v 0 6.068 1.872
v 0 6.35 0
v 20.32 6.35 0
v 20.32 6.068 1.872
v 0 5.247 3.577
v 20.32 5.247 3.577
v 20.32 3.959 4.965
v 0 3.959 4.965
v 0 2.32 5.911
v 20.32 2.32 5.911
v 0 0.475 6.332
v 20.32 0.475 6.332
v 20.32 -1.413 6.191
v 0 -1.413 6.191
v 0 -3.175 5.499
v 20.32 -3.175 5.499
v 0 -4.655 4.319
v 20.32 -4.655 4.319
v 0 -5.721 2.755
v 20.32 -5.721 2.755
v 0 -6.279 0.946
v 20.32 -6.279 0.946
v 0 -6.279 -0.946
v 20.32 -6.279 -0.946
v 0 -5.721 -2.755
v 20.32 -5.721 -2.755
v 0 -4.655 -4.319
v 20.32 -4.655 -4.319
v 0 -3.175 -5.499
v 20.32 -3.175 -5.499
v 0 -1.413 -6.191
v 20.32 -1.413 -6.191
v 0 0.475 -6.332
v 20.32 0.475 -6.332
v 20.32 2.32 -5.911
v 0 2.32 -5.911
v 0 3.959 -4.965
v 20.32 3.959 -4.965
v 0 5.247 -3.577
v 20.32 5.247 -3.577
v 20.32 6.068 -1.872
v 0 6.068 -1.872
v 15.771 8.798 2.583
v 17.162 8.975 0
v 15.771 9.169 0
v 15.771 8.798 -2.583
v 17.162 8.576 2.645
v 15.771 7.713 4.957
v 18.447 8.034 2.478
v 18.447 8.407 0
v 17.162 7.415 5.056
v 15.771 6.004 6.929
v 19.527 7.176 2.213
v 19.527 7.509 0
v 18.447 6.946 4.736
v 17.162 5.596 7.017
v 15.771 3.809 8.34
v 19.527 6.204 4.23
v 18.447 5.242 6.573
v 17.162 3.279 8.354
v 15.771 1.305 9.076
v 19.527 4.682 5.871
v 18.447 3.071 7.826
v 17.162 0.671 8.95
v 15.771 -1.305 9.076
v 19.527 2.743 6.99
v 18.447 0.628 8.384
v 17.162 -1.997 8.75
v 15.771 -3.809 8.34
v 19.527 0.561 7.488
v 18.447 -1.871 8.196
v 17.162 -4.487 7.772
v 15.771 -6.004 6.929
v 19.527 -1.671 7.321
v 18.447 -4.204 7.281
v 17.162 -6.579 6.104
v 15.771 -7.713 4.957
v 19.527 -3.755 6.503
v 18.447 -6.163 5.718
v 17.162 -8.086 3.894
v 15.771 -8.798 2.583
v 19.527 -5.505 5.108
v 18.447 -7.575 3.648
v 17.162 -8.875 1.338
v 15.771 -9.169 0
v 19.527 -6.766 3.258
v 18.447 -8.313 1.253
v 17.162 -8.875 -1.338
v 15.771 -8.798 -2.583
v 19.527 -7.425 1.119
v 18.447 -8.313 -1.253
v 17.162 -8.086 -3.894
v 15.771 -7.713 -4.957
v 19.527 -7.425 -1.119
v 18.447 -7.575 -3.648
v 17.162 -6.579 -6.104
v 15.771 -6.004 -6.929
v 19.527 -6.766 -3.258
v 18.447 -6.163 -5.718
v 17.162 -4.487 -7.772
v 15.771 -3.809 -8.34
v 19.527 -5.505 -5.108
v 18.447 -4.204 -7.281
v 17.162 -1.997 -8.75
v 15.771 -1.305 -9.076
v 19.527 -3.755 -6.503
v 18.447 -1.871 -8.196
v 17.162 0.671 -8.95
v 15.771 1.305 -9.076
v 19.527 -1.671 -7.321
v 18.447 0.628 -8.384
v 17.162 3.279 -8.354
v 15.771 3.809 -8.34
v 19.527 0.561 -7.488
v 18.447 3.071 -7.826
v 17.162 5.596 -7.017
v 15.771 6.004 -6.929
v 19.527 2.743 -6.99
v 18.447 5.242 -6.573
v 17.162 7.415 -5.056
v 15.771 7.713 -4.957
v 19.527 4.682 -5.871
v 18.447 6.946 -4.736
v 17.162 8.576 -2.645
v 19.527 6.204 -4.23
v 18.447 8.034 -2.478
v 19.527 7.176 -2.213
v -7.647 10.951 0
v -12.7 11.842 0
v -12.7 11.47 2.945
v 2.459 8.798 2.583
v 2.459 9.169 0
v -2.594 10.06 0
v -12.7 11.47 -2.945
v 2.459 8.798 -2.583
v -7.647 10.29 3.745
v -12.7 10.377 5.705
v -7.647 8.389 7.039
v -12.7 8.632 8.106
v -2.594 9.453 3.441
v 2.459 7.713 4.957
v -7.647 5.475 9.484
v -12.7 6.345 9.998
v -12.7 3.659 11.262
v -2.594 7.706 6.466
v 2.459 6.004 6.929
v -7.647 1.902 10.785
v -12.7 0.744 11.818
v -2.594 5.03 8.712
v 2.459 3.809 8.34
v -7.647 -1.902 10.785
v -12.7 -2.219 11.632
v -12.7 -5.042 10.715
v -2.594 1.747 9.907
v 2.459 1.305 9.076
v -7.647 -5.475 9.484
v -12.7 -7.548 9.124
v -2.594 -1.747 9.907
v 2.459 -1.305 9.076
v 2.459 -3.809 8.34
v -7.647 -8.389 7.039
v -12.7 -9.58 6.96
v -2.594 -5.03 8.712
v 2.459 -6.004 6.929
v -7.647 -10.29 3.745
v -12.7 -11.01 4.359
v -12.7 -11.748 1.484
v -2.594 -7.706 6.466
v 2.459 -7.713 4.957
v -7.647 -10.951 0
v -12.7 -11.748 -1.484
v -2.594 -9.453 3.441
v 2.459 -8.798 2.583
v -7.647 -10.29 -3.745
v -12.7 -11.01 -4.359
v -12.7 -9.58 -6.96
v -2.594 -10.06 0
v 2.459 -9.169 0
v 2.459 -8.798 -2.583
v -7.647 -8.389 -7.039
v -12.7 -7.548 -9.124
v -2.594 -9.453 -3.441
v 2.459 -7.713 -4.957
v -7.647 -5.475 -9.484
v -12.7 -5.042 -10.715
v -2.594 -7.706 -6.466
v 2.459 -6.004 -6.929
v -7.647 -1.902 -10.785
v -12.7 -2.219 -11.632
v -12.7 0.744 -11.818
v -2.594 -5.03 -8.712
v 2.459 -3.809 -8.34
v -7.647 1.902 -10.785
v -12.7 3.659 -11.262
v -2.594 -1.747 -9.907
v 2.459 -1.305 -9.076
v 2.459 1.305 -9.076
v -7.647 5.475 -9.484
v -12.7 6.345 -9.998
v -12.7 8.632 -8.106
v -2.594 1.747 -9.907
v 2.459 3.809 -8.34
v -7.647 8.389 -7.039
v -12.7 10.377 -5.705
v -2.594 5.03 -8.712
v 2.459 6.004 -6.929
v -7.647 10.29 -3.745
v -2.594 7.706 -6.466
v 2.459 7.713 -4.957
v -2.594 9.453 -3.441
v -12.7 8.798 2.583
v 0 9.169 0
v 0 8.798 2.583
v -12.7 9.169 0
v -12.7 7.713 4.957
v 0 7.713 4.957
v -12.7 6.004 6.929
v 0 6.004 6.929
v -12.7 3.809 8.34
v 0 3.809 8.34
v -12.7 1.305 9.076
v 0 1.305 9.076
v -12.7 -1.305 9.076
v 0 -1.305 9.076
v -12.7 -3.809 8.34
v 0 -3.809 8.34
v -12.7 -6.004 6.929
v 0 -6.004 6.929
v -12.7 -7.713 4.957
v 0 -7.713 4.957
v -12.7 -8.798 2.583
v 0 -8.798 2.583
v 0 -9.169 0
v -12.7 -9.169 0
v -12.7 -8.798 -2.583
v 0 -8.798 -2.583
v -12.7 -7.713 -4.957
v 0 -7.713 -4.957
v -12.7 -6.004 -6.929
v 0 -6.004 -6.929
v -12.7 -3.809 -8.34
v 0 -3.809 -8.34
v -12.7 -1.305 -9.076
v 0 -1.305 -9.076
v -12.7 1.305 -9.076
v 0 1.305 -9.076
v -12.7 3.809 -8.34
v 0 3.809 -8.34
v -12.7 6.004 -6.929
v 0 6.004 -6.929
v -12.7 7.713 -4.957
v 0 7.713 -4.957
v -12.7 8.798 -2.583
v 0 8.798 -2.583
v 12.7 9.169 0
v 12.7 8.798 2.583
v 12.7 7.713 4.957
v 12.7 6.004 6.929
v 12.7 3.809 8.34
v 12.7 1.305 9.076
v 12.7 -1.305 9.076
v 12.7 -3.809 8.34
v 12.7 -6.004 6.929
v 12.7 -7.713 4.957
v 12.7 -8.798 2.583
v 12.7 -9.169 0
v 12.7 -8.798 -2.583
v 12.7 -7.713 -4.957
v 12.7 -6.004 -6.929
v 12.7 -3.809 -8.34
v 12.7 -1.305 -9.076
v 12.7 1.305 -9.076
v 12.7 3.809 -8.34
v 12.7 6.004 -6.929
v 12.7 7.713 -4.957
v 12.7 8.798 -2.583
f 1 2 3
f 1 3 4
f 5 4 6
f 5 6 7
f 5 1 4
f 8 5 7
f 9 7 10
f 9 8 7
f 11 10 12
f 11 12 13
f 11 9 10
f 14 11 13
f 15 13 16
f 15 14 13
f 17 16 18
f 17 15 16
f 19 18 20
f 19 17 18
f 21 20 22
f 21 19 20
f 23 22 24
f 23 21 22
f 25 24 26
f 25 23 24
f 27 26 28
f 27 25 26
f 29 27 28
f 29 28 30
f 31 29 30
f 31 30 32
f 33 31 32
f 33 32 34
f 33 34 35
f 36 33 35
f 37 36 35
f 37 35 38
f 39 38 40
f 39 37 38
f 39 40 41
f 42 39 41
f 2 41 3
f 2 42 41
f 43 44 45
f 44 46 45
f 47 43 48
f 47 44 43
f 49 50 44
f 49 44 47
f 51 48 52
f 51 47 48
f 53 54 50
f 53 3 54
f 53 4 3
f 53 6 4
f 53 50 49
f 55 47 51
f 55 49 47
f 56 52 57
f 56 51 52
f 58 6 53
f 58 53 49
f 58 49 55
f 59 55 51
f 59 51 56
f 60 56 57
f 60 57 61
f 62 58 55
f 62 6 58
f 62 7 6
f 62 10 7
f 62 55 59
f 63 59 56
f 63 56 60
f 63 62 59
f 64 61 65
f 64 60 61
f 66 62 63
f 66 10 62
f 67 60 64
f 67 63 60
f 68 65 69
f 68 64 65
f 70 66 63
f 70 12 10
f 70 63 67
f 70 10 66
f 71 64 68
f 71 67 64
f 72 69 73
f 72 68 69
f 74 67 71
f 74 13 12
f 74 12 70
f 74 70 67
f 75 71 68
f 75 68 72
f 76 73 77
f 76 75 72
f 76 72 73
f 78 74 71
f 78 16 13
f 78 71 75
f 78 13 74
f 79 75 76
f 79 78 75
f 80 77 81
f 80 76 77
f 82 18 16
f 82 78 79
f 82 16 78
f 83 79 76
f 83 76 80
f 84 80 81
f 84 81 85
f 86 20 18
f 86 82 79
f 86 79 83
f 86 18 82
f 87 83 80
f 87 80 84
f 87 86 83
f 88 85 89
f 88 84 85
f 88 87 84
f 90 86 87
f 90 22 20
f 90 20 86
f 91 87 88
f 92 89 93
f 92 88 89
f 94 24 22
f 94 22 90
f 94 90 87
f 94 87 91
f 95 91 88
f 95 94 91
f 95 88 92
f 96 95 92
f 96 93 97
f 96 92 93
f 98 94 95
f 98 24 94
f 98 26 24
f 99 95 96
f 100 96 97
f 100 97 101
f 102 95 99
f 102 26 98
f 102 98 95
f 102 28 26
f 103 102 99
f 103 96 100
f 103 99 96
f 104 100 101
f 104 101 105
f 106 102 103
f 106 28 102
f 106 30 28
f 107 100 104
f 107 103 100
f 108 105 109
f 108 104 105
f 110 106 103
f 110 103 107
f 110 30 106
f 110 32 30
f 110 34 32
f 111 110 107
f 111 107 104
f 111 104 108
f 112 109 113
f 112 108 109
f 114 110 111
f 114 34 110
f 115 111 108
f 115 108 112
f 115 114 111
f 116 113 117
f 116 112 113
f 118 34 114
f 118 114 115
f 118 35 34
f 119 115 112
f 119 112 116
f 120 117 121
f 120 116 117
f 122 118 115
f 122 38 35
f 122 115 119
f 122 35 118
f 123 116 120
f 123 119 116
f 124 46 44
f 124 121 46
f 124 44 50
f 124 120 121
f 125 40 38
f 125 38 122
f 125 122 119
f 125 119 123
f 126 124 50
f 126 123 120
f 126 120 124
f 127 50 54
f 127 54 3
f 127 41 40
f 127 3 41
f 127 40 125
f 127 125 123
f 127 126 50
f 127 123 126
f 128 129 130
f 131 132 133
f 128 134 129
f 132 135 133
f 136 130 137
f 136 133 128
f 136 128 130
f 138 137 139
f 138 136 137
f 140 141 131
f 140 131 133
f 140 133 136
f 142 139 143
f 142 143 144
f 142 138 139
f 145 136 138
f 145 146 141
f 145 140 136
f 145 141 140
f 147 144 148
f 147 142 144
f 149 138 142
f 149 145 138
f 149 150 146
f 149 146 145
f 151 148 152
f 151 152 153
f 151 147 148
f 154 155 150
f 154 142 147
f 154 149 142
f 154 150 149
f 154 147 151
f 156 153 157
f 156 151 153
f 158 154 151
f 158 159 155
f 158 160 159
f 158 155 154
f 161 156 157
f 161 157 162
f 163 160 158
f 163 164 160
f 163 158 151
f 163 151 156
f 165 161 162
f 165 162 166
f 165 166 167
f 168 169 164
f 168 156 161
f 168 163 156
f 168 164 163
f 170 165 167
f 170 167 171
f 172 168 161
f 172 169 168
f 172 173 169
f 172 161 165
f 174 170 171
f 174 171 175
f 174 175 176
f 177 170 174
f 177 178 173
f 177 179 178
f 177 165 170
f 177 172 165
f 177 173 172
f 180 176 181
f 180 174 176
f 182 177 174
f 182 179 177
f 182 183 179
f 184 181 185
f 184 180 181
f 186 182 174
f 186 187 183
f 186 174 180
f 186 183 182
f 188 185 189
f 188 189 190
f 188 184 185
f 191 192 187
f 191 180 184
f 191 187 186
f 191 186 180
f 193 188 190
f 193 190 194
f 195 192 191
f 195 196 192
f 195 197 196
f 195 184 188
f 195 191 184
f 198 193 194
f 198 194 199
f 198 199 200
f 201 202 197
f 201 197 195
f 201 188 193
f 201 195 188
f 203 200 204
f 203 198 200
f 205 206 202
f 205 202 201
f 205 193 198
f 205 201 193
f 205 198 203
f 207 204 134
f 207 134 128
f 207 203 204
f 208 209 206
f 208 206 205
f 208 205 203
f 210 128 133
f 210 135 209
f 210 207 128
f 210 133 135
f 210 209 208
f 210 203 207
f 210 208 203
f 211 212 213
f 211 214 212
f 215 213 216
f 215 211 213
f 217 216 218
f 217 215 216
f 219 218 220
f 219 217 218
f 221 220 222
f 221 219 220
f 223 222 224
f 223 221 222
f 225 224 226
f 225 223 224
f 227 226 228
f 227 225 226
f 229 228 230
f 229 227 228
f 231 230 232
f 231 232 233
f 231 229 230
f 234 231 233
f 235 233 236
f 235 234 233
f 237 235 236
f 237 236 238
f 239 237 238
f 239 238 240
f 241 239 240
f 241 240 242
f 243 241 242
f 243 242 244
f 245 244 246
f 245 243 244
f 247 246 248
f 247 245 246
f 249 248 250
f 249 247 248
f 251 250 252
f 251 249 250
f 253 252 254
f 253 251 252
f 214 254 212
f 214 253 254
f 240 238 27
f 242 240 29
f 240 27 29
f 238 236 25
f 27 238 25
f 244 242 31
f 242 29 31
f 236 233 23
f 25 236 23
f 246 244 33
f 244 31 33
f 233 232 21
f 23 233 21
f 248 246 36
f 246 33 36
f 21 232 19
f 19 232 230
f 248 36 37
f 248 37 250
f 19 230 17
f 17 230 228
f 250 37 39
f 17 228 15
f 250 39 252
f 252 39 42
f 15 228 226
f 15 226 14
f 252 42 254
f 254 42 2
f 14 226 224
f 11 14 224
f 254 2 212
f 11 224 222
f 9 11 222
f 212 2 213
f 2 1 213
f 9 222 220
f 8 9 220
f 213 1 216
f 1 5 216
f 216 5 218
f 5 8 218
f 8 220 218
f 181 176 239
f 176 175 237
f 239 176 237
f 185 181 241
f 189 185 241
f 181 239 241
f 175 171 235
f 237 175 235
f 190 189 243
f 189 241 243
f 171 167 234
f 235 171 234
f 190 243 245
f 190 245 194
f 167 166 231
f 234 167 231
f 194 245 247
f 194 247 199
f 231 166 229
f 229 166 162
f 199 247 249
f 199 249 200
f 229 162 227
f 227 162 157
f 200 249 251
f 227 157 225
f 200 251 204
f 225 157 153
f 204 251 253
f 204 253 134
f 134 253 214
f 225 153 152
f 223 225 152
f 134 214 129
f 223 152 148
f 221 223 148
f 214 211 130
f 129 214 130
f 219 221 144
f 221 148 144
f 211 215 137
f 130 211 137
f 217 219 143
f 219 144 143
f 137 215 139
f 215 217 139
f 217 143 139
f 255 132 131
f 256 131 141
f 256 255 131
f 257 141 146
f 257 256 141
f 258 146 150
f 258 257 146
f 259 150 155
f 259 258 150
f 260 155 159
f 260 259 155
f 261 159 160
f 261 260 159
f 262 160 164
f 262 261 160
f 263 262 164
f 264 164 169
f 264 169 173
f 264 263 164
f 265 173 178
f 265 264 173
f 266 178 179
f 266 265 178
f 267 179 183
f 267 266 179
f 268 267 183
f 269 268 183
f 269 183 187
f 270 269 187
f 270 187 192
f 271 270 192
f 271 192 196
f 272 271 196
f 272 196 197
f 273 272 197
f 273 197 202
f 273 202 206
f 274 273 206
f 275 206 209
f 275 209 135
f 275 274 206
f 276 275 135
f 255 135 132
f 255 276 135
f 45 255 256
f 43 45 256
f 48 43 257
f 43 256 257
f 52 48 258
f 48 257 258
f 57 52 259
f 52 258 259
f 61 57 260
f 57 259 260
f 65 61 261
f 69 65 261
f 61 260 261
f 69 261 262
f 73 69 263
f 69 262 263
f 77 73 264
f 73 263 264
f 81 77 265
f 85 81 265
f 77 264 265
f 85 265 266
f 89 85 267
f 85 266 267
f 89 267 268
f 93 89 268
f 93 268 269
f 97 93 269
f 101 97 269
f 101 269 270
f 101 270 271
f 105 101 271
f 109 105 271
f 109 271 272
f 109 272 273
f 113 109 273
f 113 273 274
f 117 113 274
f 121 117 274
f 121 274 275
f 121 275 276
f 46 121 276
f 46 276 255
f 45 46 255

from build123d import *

# Parameters (mm, degrees)
F0_R        = 12.4431552
F0_R_2      = 9.1690063
F1_DEPTH    = 12.7
F0_R_3      = 6.35
F2_DEPTH    = 20.32
F3_S5_R     = 9.1690063
F3_T6_DEPTH = 24


# Not quite as in the source:
# - a fillet or chamfer that OpenCascade refuses, or shapes differently, is made with other operations: its cross-section is extruded or revolved along the edge and cut away or added


with BuildPart() as f1:
    # F0 (on Right) → F1 (new body, symmetric)
    with BuildSketch(Plane.YZ):
        Circle(F0_R)
        Circle(F0_R_2, mode=Mode.SUBTRACT)
    extrude(amount=F1_DEPTH, both=True)

    # F0 (on Right) → F2 (join)
    with BuildSketch(Plane.YZ):
        Circle(F0_R_2)
        Circle(F0_R_3, mode=Mode.SUBTRACT)
    extrude(amount=F2_DEPTH)

    # F3: chamfer of 5.08 x 28.8101116437 on 1 edges, made by hand


with BuildPart() as f3_tool2:
    # F3_s3 → F3_t4 (revolve)
    with BuildSketch(Plane.XY):
        Polygon((-16.1101116437, 12.4431552), (12.7, 7.3631552), (12.7, 12.4431552), align=None)
    revolve(axis=Axis((12.7, 0, 0), (1, 0, 0)))

    # F3_s5 → F3_t6 (cut, symmetric)
    with BuildSketch(Plane.YZ.offset(-1.7)):
        Circle(F3_S5_R)
    extrude(amount=F3_T6_DEPTH, both=True, mode=Mode.SUBTRACT)


with BuildPart() as f1_1:
    add(f1.part)

    # F3_t1: cut F3_tool2
    add(f3_tool2.part, mode=Mode.SUBTRACT)

    # F4: fillet of radius 5.08 on 1 edges, made by hand

    # F4_s1 → F4_t2 (revolve, cut)
    with BuildSketch(Plane.XY):
        with BuildLine():
            ThreePointArc((15.7709003651, 9.1690063), (18.44676957, 8.4071220926), (20.32, 6.35))
            Line((20.32, 6.35), (20.32, 9.1690063))
            Line((20.32, 9.1690063), (15.7709003651, 9.1690063))
        make_face()
    revolve(axis=Axis((20.32, 0, 0), (1, 0, 0)), mode=Mode.SUBTRACT)


solid = f1_1.part
